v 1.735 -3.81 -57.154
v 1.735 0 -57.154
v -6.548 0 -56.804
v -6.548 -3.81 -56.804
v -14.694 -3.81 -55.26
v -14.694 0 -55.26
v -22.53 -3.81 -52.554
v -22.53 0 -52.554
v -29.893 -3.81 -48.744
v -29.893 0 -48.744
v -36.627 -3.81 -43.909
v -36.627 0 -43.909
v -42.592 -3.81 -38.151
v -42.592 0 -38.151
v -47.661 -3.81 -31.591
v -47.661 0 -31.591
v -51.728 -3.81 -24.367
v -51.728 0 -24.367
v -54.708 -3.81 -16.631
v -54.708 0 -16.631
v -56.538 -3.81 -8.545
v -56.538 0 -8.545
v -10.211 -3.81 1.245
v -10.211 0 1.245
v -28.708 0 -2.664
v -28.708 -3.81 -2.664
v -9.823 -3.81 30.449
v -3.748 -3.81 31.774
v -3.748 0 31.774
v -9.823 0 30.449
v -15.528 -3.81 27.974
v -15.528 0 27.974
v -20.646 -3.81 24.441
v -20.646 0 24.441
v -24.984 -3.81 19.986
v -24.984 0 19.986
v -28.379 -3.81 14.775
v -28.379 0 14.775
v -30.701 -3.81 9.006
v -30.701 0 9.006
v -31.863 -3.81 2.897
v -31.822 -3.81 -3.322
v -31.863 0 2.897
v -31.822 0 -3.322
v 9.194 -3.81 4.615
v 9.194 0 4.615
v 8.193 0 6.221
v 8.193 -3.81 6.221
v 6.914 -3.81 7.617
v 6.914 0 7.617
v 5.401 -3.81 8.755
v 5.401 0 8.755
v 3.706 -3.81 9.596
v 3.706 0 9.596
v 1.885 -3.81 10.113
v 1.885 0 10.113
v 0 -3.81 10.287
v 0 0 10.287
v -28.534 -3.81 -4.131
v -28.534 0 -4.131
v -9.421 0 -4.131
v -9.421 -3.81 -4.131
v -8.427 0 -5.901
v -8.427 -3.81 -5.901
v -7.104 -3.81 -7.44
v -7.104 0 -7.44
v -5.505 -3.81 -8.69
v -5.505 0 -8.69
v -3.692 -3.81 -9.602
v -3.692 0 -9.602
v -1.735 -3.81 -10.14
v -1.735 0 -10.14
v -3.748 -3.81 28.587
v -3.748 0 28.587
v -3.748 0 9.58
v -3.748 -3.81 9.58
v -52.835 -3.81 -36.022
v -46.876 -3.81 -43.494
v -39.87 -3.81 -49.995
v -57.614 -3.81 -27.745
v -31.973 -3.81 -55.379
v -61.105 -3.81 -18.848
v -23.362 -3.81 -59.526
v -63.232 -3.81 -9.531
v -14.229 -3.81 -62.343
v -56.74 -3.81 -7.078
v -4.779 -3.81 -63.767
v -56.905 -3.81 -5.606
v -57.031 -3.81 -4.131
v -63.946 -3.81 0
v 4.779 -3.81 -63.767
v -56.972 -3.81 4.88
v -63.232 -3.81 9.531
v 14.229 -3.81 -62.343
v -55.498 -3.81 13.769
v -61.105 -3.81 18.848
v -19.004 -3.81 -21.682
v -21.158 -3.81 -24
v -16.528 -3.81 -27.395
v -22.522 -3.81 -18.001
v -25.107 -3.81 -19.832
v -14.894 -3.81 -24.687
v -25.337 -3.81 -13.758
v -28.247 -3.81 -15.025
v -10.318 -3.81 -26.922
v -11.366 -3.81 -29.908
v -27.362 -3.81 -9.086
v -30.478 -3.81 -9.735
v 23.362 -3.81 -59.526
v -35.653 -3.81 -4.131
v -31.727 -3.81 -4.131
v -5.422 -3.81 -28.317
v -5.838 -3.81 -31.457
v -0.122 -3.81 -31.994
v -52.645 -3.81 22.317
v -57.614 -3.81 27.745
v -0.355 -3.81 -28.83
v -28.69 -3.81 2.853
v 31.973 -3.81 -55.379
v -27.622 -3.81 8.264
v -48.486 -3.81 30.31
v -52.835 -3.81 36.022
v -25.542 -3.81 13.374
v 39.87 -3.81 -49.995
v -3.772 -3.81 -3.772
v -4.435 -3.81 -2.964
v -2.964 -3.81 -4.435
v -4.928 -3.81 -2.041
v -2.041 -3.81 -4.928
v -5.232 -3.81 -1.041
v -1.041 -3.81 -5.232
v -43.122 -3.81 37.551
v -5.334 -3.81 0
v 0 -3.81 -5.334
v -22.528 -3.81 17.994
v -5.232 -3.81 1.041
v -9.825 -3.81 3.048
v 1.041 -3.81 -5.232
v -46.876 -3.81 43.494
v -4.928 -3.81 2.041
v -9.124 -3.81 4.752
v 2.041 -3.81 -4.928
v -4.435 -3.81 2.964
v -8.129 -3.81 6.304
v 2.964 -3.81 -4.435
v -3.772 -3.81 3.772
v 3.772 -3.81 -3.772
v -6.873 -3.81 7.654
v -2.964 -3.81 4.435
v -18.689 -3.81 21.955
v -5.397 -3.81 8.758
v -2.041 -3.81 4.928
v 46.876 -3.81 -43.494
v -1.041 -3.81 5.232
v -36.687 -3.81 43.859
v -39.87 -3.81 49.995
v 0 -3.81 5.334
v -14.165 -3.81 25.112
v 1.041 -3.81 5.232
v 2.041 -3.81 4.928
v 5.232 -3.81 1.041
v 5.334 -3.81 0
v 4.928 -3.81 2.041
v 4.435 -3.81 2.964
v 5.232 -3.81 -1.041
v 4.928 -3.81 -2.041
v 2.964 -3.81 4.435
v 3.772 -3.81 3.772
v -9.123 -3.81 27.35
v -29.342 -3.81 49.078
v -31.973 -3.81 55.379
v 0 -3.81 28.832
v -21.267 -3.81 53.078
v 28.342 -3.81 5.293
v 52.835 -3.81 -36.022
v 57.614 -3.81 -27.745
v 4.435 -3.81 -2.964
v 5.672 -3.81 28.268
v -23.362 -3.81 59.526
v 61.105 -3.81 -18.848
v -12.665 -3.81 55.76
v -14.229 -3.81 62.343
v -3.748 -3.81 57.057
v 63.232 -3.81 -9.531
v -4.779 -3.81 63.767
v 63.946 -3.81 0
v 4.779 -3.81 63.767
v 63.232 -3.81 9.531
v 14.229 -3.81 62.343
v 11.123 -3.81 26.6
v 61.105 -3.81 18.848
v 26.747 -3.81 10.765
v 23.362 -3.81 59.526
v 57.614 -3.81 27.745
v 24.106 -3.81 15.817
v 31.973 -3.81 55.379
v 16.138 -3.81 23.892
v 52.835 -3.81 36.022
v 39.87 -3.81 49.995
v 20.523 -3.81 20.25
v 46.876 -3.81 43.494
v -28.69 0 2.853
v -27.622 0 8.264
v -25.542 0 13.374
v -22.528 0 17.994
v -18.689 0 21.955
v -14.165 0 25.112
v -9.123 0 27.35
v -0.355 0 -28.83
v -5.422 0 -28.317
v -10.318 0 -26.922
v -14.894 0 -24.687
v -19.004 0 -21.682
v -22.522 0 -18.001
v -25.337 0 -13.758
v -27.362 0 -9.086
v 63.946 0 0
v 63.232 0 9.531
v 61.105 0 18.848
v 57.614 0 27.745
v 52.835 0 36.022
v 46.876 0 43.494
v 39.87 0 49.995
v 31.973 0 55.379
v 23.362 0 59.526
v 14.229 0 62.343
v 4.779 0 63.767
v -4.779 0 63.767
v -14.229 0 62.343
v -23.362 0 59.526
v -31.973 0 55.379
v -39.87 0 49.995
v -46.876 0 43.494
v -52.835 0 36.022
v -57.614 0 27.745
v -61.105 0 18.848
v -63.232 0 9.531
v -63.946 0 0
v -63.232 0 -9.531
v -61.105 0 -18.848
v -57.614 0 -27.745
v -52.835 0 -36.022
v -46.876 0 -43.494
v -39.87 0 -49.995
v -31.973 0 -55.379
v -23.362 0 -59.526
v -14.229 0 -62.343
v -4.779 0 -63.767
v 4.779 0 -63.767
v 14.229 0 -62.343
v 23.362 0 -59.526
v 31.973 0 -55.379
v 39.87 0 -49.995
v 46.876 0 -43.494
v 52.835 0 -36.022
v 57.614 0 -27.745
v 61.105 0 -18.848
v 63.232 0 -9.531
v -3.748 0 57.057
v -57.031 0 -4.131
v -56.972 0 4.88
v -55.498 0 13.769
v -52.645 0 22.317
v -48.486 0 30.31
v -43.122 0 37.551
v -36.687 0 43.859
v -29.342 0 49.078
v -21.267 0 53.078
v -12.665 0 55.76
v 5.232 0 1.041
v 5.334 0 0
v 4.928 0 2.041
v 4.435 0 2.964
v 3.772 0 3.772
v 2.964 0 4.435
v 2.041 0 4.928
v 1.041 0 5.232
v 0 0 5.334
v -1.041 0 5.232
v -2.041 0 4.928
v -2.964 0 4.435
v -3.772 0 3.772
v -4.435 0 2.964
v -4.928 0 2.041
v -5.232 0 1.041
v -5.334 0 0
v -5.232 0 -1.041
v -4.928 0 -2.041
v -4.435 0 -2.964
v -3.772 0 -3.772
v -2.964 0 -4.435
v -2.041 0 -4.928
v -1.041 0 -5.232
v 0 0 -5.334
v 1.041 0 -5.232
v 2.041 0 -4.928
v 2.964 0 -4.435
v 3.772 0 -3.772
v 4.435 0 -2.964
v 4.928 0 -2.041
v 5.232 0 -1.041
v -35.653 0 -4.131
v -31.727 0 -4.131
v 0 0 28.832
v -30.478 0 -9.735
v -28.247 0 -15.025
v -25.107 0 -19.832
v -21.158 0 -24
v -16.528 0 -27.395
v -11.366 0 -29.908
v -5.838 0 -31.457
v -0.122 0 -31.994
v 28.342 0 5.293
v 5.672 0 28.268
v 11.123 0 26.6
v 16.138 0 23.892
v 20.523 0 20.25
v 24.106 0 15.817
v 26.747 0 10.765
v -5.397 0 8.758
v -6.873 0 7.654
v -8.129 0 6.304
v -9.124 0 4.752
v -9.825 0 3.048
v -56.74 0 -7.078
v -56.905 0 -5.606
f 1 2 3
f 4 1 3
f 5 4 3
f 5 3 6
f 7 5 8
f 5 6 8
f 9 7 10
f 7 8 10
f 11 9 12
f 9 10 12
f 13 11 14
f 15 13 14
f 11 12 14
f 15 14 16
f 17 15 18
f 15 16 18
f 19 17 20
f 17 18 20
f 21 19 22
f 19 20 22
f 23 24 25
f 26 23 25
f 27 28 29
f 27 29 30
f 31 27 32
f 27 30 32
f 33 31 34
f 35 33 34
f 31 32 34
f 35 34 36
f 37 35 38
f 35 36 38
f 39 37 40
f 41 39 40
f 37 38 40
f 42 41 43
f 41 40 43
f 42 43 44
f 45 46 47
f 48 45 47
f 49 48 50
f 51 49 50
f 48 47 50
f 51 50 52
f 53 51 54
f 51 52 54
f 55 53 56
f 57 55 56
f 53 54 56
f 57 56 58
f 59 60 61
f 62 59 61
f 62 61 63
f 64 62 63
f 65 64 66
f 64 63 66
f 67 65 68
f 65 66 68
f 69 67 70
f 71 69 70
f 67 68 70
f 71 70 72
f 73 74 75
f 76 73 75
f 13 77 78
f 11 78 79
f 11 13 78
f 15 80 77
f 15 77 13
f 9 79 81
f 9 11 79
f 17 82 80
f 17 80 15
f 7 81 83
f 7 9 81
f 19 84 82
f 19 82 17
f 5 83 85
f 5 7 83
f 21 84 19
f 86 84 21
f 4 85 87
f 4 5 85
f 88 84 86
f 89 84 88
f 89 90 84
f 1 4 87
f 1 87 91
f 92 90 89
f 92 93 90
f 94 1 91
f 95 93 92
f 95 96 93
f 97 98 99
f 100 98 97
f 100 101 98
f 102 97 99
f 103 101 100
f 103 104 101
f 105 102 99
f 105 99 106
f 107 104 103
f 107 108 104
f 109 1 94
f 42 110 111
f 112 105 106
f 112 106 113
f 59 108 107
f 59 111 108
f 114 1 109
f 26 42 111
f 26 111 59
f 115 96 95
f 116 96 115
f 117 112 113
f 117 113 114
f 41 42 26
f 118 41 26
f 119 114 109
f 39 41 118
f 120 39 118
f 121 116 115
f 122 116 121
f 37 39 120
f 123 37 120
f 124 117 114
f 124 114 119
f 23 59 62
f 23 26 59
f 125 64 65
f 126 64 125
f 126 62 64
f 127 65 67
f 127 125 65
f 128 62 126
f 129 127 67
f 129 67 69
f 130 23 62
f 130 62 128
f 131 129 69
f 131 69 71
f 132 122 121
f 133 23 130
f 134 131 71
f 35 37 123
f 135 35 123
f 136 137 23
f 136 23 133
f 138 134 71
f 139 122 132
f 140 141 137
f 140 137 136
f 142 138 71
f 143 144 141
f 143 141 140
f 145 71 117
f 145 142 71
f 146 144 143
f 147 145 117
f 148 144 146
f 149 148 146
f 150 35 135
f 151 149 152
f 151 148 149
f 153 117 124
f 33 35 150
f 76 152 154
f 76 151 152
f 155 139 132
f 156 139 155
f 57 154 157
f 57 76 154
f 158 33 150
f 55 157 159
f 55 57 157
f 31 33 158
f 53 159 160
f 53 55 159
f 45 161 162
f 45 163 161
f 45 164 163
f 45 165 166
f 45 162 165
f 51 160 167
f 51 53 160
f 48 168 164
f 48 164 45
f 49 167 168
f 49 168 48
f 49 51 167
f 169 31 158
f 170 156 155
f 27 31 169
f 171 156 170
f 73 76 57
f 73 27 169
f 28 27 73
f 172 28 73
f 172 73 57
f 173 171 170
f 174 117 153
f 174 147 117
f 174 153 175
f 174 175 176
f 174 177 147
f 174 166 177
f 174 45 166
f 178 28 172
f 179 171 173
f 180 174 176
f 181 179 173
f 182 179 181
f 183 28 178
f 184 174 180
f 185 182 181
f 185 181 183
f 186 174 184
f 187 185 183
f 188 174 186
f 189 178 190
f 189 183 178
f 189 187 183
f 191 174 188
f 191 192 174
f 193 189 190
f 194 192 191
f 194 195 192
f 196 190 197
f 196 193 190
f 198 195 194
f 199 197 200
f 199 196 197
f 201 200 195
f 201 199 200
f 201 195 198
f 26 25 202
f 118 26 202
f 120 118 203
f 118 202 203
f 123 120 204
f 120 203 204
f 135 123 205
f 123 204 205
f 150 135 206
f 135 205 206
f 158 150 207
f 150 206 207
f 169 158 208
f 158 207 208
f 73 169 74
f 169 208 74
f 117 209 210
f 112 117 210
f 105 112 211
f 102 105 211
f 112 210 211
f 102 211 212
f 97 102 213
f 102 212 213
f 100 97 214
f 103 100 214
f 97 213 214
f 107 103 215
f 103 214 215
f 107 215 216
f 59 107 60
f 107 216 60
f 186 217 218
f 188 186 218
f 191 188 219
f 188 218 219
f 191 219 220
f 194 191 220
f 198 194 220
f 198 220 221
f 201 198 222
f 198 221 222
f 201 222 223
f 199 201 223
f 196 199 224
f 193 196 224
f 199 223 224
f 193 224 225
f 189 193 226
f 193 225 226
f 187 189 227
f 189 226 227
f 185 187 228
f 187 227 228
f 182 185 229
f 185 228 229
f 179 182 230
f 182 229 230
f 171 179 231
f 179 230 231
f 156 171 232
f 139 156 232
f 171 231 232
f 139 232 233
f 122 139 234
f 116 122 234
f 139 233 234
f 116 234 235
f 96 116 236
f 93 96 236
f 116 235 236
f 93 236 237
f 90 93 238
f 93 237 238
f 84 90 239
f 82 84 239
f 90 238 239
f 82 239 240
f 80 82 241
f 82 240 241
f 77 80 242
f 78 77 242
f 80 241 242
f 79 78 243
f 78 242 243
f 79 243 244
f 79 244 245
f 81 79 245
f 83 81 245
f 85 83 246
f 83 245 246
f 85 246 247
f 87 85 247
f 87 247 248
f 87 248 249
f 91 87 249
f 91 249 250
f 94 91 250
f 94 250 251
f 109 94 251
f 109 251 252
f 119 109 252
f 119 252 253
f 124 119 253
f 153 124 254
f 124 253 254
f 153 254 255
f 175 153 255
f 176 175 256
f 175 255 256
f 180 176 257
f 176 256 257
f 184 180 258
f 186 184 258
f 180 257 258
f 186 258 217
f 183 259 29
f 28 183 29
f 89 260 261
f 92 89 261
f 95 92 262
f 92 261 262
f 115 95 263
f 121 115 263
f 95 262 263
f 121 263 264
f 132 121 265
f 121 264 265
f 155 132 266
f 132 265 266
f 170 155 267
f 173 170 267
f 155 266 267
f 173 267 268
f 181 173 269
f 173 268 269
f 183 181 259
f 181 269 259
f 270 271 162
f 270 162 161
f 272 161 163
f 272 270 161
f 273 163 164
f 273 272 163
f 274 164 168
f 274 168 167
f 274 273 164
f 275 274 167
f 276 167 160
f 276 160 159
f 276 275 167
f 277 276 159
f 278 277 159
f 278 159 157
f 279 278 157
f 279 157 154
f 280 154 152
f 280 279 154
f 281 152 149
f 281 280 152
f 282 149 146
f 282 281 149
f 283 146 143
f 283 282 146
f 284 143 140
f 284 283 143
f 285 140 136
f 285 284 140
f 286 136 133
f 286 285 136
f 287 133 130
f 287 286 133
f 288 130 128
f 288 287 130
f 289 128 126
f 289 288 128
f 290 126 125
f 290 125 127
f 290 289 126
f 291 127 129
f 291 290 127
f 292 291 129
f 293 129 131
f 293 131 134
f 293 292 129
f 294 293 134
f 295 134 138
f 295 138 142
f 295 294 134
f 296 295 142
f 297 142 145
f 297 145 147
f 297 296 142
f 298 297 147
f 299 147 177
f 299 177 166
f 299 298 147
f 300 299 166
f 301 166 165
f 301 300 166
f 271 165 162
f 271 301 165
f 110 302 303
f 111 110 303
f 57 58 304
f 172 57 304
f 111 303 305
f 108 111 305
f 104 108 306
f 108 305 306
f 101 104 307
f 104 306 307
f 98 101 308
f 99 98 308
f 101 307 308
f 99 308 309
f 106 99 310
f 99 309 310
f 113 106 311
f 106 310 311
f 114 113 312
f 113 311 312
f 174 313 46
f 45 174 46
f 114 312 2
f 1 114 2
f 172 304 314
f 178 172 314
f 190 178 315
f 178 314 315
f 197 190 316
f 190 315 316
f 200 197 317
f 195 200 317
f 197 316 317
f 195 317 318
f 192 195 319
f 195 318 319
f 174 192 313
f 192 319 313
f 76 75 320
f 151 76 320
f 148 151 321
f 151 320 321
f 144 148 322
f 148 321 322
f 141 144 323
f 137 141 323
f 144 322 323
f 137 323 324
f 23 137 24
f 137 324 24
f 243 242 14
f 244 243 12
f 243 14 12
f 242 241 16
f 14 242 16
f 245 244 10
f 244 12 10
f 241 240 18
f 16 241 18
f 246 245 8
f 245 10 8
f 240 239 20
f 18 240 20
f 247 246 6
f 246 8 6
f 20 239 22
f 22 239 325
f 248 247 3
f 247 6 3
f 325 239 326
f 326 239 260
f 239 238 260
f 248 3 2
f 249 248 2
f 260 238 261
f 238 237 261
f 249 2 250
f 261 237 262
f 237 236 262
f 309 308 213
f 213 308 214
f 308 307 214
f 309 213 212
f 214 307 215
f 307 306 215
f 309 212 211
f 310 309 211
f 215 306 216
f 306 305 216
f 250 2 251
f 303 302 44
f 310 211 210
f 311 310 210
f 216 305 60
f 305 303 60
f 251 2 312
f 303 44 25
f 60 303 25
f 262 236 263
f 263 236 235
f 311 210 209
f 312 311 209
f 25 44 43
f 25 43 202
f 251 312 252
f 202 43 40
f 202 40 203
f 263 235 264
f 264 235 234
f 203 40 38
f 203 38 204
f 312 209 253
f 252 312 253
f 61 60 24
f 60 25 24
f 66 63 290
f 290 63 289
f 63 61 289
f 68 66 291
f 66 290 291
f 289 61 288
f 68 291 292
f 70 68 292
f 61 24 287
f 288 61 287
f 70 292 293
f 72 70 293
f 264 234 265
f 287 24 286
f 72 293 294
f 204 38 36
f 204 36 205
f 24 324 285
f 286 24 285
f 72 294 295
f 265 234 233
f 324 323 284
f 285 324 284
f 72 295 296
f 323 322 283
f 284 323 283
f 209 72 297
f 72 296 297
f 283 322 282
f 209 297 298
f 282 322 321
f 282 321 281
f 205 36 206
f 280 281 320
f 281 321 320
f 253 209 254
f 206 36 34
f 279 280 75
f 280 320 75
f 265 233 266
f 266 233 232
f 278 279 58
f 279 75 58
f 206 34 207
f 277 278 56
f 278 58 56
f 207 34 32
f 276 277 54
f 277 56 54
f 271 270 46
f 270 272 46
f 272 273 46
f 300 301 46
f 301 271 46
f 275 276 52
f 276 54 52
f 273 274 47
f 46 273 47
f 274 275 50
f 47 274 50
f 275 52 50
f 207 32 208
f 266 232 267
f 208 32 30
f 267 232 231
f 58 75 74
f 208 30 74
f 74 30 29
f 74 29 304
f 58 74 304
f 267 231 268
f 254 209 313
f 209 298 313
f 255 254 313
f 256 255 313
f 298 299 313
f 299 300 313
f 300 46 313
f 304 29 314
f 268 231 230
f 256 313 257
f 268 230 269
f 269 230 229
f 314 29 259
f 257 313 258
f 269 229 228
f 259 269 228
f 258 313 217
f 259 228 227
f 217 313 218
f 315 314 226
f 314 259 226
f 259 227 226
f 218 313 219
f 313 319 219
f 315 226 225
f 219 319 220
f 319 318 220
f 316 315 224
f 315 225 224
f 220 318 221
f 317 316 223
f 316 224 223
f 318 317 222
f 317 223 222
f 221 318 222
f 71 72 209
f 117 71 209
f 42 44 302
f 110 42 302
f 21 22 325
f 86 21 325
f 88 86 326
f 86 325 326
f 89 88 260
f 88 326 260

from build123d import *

# Parameters (mm, degrees)
F0_R     = 63.946243
F0_R_2   = 5.334163
F1_DEPTH = 3.81


with BuildPart() as f1:
    # F0 (on Front) → F1 (new body)
    with BuildSketch(Plane.XZ):
        Circle(F0_R)
        with BuildLine():
            ThreePointArc((-0.355494, -28.829536), (-19.004092, -21.682089), (-28.534216, -4.131221))
            Line((-28.534216, -4.131221), (-9.421132, -4.131221))
            ThreePointArc((-9.421132, -4.131221), (-6.335532, -8.104675), (-1.734714, -10.139797))
            Line((-1.734714, -10.139797), (-0.355494, -28.829536))
        make_face(mode=Mode.SUBTRACT)
        with BuildLine():
            ThreePointArc((-57.030724, -4.131221), (-43.12199, 37.550825), (-3.747552, 57.05722))
            Line((-3.747552, 57.05722), (-3.747552, 31.774284))
            ThreePointArc((-3.747552, 31.774284), (-24.98442, 19.985696), (-31.821637, -3.321552))
            Line((-31.821637, -3.321552), (-35.653092, -4.131221))
            Line((-35.653092, -4.131221), (-31.726681, -4.131221))
            ThreePointArc((-31.726681, -4.131221), (-21.158247, -23.999539), (-0.121949, -31.994287))
            Line((-0.121949, -31.994287), (1.734714, -57.153839))
            ThreePointArc((1.734714, -57.153839), (-36.627394, -43.909048), (-56.53812, -8.544678))
            ThreePointArc((-56.53812, -8.544678), (-56.827284, -6.342733), (-57.030724, -4.131221))
        make_face(mode=Mode.SUBTRACT)
        with BuildLine():
            Line((-10.211481, 1.24514), (-28.70842, -2.663662))
            ThreePointArc((-28.70842, -2.663662), (-22.527775, 17.99355), (-3.747552, 28.587136))
            Line((-3.747552, 28.587136), (-3.747552, 9.580218))
            ThreePointArc((-3.747552, 9.580218), (-8.129086, 6.30418), (-10.211481, 1.24514))
        make_face(mode=Mode.SUBTRACT)
        Circle(F0_R_2, mode=Mode.SUBTRACT)
        with BuildLine():
            Line((0, 10.287114), (0, 28.831727))
            ThreePointArc((0, 28.831727), (18.420957, 22.179649), (28.341719, 5.292961))
            Line((28.341719, 5.292961), (9.193887, 4.614885))
            ThreePointArc((9.193887, 4.614885), (5.401429, 8.754958), (0, 10.287114))
        make_face(mode=Mode.SUBTRACT)
        with BuildLine():
            Line((0, 31.99452), (0, 57.180158))
            ThreePointArc((0, 57.180158), (38.724459, 42.071211), (56.984273, 4.728966))
            Line((56.984273, 4.728966), (30.757176, 8.811666))
            ThreePointArc((30.757176, 8.811666), (19.257781, 25.5497), (0, 31.99452))
        make_face(mode=Mode.SUBTRACT)
        with BuildLine():
            ThreePointArc((56.984273, 4.728966), (38.724459, 42.071211), (0, 57.180158))
            Line((0, 57.180158), (0, 31.99452))
            ThreePointArc((0, 31.99452), (19.257781, 25.5497), (30.757176, 8.811666))
            Line((30.757176, 8.811666), (56.984273, 4.728966))
        make_face()
    extrude(amount=F1_DEPTH)


solid = f1.part
